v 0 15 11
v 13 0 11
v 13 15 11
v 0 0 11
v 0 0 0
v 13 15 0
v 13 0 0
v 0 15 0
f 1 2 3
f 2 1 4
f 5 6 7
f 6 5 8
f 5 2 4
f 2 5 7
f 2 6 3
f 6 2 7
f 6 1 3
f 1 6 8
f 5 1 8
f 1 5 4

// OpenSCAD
// Generated by SolidPython 1.0.1 on 2020-07-29 00:46:55


cube(size = [13, 15, 11]);
/***********************************************
*********      SolidPython code:      **********
************************************************
 
# import packages: SolidPython
from solid import *
from solid.utils import *
from itertools import chain, combinations, permutations


class Resize:

    def __init__(self, scad_file):
        self.scad_file = scad_file
        #self.scad_file = import_scad(scad_file)
        # cone/cylinder param:
        self.r1 = 0
        self.r2 = 0
        self.h = 0
        # rectangular prism param:
        self.w = 0
        self.l = 0
        # ellipse param:
        self.r = 0

    # import OpenScad code (file name corresponds to shape)


    # classify shape + parameters
    def assign(self, param1, param2, param3):
        if self.scad_file == 'cone.scad':
            self.r1 = param1
            self.r2 = param2
            self.h = param3
        elif self.scad_file == 'cylinder.scad':
            self.r1 = param1
            self.r2 = param2
            self.h = param3
        elif self.scad_file == 'rectangularPrism.scad':
            self.h = param1
            self.l = param2
            self.w = param3
        else:
            self.r = param1
            self.h = param2

    # resize parameters
    def iterate(self):
        x = range(3, 20, 2)
        i = 1
        if self.scad_file == 'cone.scad':
            tempList = list(permutations(x, 2))
            for temp in tempList:
                param1 = temp[0]
                param2 = temp[1]
                filepath = 'produced_scad_files/' + 'cone' + str(param1) + '_' + str(param2) + '_' + '.scad'
                scad_render_to_file(cylinder(h=param1, r1=param2, r2=0), filepath)

        elif self.scad_file == 'cylinder.scad':
            tempList = list(permutations(x, 3))
            for temp in tempList:
                param1 = temp[0]
                param2 = temp[1]
                filepath = 'produced_scad_files/' + 'cylinder' + str(param1) + '_' + str(param2) + '_' + '.scad'
                scad_render_to_file(cylinder(h=param1, r1=param2, r2=param2), filepath)

        elif self.scad_file == 'rectangularPrism.scad':
            tempList = list(permutations(x, 3))
            for temp in tempList:
                param1 = temp[0]
                param2 = temp[1]
                param3 = temp[2]
                filepath = 'produced_scad_files/' + 'rectangularPrism' + str(param1) + '_' + str(param2) + '_' + str(
                    param3) + '.scad'
                scad_render_to_file(cube(size=(param1, param2, param3)), filepath)

        elif self.scad_file == 'ellipse.scad':
            tempList = list(permutations(x, 4))
            for temp in tempList:
                param1 = temp[0]
                param2 = temp[1]
                param3 = temp[2]
                param4 = temp[3]
                filepath = 'produced_scad_files/' + 'ellipse' + str(param1) + '_' + str(param2) + '_' + str(param3) + '_' + str(param4) + '.scad'
                scad_render_to_file(scale([param1, param2, param3])(sphere(r=param4)), filepath)

    def render_to_scadfile(self):
        scad_render_to_file(scad, 'example.scad') 
 
************************************************/
